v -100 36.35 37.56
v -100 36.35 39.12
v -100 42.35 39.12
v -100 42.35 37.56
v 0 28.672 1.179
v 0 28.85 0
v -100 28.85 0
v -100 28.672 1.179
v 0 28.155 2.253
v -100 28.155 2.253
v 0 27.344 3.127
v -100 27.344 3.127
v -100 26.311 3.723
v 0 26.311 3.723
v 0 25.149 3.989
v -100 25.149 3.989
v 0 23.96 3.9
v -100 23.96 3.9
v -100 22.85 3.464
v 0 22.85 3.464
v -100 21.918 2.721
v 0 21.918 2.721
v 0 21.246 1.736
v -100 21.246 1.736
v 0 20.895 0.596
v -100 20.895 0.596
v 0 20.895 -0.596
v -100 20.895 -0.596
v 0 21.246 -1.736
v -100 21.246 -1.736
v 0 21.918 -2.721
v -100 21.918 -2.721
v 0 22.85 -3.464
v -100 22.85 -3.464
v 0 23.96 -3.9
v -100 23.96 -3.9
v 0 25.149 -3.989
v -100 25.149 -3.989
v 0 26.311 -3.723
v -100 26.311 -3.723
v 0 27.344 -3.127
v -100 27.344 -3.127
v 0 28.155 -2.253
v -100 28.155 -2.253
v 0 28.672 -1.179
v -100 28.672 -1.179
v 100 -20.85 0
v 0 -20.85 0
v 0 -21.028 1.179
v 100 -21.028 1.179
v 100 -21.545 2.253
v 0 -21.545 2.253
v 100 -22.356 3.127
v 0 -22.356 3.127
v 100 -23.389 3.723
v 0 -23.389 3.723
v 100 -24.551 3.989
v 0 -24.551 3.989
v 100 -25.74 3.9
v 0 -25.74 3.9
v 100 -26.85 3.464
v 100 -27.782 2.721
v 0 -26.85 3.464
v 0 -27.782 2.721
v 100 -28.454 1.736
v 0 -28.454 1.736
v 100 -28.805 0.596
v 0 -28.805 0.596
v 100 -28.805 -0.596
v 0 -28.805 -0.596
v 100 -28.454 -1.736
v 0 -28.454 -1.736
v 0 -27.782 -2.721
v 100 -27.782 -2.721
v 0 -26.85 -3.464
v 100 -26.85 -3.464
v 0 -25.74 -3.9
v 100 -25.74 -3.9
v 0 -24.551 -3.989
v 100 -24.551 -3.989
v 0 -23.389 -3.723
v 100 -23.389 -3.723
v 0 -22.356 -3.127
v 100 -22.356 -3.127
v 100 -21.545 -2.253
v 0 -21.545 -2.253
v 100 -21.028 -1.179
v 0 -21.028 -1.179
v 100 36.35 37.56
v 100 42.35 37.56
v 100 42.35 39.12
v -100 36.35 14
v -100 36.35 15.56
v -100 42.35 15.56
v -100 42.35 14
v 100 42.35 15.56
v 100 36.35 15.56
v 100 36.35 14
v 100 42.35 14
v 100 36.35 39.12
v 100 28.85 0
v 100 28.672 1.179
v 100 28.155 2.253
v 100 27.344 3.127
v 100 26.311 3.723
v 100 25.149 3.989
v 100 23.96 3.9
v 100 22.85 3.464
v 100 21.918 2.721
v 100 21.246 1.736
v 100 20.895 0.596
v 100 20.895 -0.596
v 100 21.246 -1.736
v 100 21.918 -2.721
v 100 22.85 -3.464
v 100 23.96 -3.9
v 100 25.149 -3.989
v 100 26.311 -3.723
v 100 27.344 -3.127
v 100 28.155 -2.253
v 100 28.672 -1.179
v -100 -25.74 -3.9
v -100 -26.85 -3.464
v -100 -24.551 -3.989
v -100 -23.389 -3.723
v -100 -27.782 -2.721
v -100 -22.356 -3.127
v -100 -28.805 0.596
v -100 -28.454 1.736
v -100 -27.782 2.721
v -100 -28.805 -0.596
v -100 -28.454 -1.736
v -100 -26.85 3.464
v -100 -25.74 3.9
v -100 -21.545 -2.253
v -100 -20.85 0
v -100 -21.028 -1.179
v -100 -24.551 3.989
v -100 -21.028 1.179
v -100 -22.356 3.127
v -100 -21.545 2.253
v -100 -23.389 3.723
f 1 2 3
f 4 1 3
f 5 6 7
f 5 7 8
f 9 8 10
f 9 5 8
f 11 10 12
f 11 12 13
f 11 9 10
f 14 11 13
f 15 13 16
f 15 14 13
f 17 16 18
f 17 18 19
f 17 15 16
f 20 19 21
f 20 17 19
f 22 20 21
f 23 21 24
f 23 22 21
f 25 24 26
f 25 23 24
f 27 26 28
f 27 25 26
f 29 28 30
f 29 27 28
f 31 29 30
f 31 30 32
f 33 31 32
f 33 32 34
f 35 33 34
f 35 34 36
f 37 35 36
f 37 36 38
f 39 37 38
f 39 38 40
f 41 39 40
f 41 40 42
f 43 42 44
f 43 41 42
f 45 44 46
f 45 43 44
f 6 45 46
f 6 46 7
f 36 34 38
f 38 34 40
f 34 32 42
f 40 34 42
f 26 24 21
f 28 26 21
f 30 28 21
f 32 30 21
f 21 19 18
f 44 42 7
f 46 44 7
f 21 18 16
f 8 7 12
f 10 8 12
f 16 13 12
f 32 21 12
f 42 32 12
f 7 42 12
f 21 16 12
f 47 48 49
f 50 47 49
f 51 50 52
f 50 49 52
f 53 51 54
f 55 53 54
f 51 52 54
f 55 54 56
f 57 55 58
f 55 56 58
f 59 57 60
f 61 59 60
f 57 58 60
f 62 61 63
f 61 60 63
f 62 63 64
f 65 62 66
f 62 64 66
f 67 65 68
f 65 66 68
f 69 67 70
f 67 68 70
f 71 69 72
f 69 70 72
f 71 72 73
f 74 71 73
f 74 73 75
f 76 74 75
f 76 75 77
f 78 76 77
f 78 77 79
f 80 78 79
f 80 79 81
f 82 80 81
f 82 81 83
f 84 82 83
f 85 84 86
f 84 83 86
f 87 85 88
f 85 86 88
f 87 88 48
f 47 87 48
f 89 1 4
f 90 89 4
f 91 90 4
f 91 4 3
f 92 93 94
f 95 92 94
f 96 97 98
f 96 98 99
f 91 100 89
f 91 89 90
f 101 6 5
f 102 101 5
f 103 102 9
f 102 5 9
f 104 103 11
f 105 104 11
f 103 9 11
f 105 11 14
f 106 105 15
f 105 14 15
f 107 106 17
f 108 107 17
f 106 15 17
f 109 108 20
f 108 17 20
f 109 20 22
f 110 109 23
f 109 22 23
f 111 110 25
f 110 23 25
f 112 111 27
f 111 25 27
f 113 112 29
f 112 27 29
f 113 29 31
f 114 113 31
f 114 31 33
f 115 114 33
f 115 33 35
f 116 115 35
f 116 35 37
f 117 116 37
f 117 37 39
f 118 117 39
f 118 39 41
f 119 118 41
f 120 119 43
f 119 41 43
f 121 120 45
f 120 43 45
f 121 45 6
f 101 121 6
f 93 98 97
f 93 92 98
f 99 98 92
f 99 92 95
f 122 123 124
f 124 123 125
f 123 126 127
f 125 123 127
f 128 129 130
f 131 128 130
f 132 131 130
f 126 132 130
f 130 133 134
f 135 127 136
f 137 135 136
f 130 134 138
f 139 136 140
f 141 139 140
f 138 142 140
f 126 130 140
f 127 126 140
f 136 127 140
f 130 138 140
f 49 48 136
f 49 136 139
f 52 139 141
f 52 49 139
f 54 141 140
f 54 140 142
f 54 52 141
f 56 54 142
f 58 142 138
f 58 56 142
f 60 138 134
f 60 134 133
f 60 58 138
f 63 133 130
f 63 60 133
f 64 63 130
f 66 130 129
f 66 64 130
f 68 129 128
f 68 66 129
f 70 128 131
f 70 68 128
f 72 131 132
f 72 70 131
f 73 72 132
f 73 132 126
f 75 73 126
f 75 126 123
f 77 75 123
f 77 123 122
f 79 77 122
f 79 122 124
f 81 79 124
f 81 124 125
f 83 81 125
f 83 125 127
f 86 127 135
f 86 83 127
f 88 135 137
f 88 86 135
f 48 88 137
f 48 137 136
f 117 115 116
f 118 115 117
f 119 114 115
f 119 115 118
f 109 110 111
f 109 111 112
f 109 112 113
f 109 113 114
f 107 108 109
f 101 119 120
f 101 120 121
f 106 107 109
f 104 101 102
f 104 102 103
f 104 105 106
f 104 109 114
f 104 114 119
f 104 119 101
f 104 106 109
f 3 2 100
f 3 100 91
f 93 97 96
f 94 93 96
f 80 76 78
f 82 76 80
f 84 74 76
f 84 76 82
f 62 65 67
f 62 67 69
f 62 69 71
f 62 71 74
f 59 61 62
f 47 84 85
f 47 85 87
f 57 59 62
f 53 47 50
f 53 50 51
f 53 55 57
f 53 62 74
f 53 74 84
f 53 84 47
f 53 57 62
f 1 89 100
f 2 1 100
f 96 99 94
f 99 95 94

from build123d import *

# Parameters (mm, degrees)
F0_R     = 4
F0_W     = 6
F0_H     = 1.56
F1_DEPTH = 100


with BuildPart() as f1:
    # F0 (on Right) → F1 (new body, symmetric)
    with BuildSketch(Plane.YZ):
        with Locations((-24.85, 0)):
            Circle(F0_R)
        with Locations((24.85, 0)):
            Circle(F0_R)
        with Locations((39.35, 14.78)):
            Rectangle(F0_W, F0_H)
        with Locations((39.35, 38.34)):
            Rectangle(F0_W, F0_H)
    extrude(amount=F1_DEPTH, both=True)


solid = f1.part
